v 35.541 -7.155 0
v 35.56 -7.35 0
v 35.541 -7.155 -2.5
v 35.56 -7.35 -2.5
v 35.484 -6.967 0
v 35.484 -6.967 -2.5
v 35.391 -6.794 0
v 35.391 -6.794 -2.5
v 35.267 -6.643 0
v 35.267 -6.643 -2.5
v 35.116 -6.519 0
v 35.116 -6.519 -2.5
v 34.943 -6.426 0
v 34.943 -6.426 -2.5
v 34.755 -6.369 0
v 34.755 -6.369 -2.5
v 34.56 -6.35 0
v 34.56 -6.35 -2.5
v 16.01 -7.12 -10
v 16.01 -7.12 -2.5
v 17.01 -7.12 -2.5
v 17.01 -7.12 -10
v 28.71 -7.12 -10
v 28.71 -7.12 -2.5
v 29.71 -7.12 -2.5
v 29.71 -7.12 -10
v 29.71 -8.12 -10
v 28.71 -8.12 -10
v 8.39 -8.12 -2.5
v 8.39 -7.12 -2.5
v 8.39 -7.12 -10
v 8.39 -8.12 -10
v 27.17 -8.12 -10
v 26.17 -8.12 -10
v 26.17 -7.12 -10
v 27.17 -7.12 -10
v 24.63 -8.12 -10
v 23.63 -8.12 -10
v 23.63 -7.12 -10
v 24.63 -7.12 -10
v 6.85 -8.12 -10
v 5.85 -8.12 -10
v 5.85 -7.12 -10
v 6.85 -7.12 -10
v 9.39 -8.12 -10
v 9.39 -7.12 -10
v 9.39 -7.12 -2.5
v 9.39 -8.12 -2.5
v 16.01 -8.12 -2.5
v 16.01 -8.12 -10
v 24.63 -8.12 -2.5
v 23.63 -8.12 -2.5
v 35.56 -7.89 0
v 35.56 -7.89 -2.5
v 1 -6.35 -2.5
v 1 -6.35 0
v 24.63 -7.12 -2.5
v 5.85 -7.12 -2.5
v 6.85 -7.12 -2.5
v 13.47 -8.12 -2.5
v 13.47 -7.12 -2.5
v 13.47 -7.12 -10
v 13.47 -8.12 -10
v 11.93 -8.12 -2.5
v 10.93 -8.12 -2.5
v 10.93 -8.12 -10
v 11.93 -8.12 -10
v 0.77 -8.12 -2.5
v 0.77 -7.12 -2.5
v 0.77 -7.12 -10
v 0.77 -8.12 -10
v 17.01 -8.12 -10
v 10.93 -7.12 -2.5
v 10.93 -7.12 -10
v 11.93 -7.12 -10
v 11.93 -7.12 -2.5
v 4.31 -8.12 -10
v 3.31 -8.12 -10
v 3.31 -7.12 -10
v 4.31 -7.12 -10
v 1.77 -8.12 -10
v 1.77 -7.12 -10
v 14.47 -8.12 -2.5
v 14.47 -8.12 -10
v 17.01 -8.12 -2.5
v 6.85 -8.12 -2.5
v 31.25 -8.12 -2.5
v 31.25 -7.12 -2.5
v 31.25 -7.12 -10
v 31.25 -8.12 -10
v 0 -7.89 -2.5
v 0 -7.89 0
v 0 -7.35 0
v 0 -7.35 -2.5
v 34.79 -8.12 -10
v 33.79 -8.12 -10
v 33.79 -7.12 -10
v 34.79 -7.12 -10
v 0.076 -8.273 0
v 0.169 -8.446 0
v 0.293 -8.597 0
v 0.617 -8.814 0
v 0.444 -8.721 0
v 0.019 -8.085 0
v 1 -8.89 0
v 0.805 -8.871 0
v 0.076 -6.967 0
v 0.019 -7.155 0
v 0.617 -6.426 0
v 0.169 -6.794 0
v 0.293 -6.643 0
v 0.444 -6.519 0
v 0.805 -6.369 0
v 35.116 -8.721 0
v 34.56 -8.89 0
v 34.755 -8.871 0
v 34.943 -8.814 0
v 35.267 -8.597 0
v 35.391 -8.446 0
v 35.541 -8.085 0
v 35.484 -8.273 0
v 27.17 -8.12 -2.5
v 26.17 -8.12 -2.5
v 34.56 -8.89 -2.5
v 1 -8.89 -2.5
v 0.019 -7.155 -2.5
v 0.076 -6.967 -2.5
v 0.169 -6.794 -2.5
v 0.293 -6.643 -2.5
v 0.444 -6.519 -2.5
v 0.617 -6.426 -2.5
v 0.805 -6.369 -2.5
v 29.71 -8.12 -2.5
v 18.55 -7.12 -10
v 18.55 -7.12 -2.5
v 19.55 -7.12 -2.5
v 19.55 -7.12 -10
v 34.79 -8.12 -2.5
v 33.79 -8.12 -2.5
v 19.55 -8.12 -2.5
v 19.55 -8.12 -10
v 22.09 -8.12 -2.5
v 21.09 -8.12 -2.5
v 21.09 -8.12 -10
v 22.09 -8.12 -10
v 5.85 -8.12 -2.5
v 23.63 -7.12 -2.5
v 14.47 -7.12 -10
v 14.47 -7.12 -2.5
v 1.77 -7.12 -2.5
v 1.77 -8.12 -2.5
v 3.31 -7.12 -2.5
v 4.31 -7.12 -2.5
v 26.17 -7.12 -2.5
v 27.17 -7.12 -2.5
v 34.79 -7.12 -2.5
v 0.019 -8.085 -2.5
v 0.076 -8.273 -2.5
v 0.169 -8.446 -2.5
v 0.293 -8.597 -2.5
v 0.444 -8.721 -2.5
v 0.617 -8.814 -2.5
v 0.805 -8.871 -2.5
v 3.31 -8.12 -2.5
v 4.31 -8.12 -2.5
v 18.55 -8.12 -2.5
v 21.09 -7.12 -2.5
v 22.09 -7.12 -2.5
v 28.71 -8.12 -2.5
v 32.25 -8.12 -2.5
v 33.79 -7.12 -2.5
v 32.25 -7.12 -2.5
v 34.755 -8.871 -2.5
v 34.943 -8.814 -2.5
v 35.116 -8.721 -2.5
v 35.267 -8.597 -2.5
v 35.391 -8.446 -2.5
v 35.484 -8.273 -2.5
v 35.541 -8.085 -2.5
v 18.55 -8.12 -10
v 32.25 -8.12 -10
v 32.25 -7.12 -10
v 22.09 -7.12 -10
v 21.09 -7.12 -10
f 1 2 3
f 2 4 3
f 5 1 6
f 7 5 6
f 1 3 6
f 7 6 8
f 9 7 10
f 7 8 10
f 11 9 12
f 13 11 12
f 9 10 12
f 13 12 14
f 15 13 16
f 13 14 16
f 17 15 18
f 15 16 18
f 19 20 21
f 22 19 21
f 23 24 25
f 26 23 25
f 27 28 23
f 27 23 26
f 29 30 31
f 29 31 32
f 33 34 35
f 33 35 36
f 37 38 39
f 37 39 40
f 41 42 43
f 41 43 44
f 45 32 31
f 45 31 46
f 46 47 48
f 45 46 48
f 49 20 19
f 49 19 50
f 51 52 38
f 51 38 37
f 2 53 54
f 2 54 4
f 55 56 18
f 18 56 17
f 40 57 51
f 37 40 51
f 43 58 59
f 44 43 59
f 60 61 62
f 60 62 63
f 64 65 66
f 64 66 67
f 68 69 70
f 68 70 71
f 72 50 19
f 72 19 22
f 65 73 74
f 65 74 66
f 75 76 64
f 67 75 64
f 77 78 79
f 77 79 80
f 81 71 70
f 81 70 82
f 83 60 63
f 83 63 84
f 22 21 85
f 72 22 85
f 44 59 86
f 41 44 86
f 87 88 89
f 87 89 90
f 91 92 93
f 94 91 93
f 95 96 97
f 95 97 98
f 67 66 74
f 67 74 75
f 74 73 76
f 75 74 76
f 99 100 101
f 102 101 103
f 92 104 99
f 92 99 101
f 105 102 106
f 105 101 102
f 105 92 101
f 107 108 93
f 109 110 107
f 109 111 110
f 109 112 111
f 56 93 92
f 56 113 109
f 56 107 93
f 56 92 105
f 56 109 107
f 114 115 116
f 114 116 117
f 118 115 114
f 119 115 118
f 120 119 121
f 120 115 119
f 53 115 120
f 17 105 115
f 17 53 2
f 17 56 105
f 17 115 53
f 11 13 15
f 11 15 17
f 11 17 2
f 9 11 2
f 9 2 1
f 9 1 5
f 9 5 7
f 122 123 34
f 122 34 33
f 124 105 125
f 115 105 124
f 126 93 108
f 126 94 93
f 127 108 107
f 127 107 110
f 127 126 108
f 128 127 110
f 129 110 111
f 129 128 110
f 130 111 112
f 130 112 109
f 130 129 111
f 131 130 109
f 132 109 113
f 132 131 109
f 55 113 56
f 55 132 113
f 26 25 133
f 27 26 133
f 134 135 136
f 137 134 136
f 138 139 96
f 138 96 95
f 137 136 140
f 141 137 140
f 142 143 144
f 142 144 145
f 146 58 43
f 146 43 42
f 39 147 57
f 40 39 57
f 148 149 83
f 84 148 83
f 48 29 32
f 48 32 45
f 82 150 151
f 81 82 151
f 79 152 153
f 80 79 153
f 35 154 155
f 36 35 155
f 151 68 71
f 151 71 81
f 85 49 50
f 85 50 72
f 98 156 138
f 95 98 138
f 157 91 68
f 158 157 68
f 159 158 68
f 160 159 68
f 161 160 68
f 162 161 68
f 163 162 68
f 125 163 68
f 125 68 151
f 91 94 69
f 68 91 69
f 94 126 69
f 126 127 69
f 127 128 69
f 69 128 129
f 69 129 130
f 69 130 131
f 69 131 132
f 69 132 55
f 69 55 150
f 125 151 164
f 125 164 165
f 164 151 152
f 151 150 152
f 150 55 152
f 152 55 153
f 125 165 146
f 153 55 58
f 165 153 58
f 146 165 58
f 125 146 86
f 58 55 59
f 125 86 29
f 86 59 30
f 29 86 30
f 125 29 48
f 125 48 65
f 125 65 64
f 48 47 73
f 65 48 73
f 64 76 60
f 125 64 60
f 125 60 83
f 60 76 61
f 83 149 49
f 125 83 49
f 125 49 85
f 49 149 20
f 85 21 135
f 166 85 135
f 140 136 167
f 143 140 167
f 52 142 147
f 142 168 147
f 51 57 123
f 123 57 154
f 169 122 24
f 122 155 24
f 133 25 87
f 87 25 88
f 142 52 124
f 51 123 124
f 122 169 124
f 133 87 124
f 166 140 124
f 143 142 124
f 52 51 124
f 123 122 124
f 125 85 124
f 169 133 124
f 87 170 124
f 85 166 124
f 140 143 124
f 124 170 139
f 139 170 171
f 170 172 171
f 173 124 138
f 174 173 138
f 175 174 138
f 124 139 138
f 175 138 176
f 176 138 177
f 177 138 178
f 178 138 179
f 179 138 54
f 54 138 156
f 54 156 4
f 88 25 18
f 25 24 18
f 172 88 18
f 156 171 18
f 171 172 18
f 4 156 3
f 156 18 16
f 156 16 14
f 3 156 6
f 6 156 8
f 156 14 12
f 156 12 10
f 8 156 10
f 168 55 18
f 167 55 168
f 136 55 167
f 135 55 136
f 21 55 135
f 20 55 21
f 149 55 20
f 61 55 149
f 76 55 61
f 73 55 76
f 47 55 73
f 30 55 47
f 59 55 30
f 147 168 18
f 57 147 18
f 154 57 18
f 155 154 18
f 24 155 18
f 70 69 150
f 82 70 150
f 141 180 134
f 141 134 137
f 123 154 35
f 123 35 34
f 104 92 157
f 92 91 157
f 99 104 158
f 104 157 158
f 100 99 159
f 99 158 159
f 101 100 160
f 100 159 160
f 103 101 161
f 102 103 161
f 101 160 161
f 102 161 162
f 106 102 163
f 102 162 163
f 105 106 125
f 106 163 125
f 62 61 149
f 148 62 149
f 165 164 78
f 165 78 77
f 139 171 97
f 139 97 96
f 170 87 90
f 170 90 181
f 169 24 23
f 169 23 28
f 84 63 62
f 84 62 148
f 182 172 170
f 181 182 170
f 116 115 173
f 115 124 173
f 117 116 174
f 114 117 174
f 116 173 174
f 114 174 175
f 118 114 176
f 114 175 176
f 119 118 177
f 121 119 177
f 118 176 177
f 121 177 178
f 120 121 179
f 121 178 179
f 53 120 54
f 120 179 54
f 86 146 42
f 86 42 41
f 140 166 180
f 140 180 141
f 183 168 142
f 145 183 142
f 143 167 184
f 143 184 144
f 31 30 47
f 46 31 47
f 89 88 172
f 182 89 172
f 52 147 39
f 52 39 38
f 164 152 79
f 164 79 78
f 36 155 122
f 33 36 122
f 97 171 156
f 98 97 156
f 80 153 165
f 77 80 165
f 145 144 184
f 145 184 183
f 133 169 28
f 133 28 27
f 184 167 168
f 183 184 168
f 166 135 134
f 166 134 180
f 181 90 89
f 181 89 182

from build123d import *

# Parameters (mm, degrees)
SKETCH002_W         = 35.56
SKETCH002_H         = 2.54
PAD002_DEPTH        = 2.5
FILLET001_R         = 1
SKETCH003_W         = 1
SKETCH003_H         = 1
PAD003_DEPTH        = 7.5
LINEARPATTERN_COUNT = 14
LINEARPATTERN_PITCH = 2.54


with BuildPart() as part:
    # Sketch002 → Pad002 (new body)
    with BuildSketch(Plane.XY):
        with Locations((17.78, 0)):
            Rectangle(SKETCH002_W, SKETCH002_H)
    extrude(amount=-PAD002_DEPTH)

    # Fillet001
    fillet001_edges = [part.edges().sort_by_distance(p)[0] for p in [
        (35.56, 1.27, -1.25),
        (35.56, -1.27, -1.25),
        (0, 1.27, -1.25),
        (0, -1.27, -1.25),
    ]]
    fillet(fillet001_edges, radius=FILLET001_R)

    # Sketch003 (on Face5 of Fillet001) → Pad003 (join)
    with BuildSketch(Plane(origin=(0, 0, -2.5), x_dir=(1, 0, 0), z_dir=(0, 0, -1))):
        with Locations((1.27, 0)):
            Rectangle(SKETCH003_W, SKETCH003_H)
    pad003 = extrude(amount=PAD003_DEPTH)

    # LinearPattern: Pad003 ×14
    with Locations(*[(i * LINEARPATTERN_PITCH, 0, 0) for i in range(1, LINEARPATTERN_COUNT)]):
        add(pad003)


with BuildPart() as part_1:
    # Body001 placement: moved
    add(part.part.moved(Location((0, 7.62, 0))))


with BuildPart() as part_2:
    # Body002 placement: moved
    add(part_1.part.moved(Location((0, -15.24, 0))))


solid = part_2.part
